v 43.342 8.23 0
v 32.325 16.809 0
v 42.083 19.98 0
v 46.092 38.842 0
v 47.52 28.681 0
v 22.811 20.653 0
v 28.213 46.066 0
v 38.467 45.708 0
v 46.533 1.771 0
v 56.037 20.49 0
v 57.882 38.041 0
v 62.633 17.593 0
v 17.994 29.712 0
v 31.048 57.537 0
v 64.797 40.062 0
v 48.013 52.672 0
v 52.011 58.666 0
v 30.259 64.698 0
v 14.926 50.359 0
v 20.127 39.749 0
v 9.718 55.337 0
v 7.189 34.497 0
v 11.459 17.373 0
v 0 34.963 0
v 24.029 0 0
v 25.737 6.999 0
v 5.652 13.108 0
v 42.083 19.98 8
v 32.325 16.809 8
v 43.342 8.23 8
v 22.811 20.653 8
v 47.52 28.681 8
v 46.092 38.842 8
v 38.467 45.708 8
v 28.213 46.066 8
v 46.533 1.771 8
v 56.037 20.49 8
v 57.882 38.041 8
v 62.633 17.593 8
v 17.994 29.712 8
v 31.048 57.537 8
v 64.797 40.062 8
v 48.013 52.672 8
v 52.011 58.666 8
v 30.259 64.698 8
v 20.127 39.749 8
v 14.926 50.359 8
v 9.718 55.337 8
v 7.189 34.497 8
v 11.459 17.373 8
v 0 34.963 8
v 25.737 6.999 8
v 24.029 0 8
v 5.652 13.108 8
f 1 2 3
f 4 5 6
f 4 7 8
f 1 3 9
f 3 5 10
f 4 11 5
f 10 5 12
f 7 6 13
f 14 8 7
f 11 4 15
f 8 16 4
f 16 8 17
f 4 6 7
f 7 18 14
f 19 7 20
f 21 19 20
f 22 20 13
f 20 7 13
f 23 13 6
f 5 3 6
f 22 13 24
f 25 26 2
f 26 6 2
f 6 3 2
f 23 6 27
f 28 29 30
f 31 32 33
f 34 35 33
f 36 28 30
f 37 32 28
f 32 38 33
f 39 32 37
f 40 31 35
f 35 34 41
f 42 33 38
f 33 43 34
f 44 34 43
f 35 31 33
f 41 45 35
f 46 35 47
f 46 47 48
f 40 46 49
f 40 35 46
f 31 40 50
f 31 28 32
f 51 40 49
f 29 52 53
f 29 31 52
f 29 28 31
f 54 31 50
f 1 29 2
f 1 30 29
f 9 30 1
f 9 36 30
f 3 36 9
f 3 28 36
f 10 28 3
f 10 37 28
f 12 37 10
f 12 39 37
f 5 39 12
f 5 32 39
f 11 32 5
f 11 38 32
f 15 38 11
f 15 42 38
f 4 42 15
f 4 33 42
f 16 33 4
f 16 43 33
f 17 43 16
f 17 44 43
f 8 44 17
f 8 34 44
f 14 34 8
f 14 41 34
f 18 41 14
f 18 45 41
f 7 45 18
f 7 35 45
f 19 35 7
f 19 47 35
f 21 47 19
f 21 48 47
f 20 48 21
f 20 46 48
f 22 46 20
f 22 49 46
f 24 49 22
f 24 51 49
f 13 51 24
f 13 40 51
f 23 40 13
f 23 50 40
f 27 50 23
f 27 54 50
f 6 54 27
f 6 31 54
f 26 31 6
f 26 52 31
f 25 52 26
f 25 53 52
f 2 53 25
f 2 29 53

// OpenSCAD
$fn = 32;

// ----------------------------------------------------------------------
// Fan rotor section: 9 blades, 15 mm hub radius, 18 mm blades
// ----------------------------------------------------------------------

// --- parameters (mm) ---
profile_height = 8;       // extrusion height
profile_points = 27;      // points of the closed outline

profile = [[47.52, 28.681], [57.882, 38.041], [64.797, 40.062], [46.092, 38.842], [48.013, 52.672], [52.011, 58.666], [38.467, 45.708], [31.048, 57.537], [30.259, 64.698], [28.213, 46.066], [14.926, 50.359], [9.718, 55.337], [20.127, 39.749], [7.189, 34.497], [0, 34.963], [17.994, 29.712], [11.459, 17.373], [5.652, 13.108], [22.811, 20.653], [25.737, 6.999], [24.029, 0], [32.325, 16.809], [43.342, 8.23], [46.533, 1.771], [42.083, 19.98], [56.037, 20.49], [62.633, 17.593]];  // single closed polygon, 27 points, counter clockwise

// --- the one profile operation ---
linear_extrude(height = profile_height) polygon(points = profile);
